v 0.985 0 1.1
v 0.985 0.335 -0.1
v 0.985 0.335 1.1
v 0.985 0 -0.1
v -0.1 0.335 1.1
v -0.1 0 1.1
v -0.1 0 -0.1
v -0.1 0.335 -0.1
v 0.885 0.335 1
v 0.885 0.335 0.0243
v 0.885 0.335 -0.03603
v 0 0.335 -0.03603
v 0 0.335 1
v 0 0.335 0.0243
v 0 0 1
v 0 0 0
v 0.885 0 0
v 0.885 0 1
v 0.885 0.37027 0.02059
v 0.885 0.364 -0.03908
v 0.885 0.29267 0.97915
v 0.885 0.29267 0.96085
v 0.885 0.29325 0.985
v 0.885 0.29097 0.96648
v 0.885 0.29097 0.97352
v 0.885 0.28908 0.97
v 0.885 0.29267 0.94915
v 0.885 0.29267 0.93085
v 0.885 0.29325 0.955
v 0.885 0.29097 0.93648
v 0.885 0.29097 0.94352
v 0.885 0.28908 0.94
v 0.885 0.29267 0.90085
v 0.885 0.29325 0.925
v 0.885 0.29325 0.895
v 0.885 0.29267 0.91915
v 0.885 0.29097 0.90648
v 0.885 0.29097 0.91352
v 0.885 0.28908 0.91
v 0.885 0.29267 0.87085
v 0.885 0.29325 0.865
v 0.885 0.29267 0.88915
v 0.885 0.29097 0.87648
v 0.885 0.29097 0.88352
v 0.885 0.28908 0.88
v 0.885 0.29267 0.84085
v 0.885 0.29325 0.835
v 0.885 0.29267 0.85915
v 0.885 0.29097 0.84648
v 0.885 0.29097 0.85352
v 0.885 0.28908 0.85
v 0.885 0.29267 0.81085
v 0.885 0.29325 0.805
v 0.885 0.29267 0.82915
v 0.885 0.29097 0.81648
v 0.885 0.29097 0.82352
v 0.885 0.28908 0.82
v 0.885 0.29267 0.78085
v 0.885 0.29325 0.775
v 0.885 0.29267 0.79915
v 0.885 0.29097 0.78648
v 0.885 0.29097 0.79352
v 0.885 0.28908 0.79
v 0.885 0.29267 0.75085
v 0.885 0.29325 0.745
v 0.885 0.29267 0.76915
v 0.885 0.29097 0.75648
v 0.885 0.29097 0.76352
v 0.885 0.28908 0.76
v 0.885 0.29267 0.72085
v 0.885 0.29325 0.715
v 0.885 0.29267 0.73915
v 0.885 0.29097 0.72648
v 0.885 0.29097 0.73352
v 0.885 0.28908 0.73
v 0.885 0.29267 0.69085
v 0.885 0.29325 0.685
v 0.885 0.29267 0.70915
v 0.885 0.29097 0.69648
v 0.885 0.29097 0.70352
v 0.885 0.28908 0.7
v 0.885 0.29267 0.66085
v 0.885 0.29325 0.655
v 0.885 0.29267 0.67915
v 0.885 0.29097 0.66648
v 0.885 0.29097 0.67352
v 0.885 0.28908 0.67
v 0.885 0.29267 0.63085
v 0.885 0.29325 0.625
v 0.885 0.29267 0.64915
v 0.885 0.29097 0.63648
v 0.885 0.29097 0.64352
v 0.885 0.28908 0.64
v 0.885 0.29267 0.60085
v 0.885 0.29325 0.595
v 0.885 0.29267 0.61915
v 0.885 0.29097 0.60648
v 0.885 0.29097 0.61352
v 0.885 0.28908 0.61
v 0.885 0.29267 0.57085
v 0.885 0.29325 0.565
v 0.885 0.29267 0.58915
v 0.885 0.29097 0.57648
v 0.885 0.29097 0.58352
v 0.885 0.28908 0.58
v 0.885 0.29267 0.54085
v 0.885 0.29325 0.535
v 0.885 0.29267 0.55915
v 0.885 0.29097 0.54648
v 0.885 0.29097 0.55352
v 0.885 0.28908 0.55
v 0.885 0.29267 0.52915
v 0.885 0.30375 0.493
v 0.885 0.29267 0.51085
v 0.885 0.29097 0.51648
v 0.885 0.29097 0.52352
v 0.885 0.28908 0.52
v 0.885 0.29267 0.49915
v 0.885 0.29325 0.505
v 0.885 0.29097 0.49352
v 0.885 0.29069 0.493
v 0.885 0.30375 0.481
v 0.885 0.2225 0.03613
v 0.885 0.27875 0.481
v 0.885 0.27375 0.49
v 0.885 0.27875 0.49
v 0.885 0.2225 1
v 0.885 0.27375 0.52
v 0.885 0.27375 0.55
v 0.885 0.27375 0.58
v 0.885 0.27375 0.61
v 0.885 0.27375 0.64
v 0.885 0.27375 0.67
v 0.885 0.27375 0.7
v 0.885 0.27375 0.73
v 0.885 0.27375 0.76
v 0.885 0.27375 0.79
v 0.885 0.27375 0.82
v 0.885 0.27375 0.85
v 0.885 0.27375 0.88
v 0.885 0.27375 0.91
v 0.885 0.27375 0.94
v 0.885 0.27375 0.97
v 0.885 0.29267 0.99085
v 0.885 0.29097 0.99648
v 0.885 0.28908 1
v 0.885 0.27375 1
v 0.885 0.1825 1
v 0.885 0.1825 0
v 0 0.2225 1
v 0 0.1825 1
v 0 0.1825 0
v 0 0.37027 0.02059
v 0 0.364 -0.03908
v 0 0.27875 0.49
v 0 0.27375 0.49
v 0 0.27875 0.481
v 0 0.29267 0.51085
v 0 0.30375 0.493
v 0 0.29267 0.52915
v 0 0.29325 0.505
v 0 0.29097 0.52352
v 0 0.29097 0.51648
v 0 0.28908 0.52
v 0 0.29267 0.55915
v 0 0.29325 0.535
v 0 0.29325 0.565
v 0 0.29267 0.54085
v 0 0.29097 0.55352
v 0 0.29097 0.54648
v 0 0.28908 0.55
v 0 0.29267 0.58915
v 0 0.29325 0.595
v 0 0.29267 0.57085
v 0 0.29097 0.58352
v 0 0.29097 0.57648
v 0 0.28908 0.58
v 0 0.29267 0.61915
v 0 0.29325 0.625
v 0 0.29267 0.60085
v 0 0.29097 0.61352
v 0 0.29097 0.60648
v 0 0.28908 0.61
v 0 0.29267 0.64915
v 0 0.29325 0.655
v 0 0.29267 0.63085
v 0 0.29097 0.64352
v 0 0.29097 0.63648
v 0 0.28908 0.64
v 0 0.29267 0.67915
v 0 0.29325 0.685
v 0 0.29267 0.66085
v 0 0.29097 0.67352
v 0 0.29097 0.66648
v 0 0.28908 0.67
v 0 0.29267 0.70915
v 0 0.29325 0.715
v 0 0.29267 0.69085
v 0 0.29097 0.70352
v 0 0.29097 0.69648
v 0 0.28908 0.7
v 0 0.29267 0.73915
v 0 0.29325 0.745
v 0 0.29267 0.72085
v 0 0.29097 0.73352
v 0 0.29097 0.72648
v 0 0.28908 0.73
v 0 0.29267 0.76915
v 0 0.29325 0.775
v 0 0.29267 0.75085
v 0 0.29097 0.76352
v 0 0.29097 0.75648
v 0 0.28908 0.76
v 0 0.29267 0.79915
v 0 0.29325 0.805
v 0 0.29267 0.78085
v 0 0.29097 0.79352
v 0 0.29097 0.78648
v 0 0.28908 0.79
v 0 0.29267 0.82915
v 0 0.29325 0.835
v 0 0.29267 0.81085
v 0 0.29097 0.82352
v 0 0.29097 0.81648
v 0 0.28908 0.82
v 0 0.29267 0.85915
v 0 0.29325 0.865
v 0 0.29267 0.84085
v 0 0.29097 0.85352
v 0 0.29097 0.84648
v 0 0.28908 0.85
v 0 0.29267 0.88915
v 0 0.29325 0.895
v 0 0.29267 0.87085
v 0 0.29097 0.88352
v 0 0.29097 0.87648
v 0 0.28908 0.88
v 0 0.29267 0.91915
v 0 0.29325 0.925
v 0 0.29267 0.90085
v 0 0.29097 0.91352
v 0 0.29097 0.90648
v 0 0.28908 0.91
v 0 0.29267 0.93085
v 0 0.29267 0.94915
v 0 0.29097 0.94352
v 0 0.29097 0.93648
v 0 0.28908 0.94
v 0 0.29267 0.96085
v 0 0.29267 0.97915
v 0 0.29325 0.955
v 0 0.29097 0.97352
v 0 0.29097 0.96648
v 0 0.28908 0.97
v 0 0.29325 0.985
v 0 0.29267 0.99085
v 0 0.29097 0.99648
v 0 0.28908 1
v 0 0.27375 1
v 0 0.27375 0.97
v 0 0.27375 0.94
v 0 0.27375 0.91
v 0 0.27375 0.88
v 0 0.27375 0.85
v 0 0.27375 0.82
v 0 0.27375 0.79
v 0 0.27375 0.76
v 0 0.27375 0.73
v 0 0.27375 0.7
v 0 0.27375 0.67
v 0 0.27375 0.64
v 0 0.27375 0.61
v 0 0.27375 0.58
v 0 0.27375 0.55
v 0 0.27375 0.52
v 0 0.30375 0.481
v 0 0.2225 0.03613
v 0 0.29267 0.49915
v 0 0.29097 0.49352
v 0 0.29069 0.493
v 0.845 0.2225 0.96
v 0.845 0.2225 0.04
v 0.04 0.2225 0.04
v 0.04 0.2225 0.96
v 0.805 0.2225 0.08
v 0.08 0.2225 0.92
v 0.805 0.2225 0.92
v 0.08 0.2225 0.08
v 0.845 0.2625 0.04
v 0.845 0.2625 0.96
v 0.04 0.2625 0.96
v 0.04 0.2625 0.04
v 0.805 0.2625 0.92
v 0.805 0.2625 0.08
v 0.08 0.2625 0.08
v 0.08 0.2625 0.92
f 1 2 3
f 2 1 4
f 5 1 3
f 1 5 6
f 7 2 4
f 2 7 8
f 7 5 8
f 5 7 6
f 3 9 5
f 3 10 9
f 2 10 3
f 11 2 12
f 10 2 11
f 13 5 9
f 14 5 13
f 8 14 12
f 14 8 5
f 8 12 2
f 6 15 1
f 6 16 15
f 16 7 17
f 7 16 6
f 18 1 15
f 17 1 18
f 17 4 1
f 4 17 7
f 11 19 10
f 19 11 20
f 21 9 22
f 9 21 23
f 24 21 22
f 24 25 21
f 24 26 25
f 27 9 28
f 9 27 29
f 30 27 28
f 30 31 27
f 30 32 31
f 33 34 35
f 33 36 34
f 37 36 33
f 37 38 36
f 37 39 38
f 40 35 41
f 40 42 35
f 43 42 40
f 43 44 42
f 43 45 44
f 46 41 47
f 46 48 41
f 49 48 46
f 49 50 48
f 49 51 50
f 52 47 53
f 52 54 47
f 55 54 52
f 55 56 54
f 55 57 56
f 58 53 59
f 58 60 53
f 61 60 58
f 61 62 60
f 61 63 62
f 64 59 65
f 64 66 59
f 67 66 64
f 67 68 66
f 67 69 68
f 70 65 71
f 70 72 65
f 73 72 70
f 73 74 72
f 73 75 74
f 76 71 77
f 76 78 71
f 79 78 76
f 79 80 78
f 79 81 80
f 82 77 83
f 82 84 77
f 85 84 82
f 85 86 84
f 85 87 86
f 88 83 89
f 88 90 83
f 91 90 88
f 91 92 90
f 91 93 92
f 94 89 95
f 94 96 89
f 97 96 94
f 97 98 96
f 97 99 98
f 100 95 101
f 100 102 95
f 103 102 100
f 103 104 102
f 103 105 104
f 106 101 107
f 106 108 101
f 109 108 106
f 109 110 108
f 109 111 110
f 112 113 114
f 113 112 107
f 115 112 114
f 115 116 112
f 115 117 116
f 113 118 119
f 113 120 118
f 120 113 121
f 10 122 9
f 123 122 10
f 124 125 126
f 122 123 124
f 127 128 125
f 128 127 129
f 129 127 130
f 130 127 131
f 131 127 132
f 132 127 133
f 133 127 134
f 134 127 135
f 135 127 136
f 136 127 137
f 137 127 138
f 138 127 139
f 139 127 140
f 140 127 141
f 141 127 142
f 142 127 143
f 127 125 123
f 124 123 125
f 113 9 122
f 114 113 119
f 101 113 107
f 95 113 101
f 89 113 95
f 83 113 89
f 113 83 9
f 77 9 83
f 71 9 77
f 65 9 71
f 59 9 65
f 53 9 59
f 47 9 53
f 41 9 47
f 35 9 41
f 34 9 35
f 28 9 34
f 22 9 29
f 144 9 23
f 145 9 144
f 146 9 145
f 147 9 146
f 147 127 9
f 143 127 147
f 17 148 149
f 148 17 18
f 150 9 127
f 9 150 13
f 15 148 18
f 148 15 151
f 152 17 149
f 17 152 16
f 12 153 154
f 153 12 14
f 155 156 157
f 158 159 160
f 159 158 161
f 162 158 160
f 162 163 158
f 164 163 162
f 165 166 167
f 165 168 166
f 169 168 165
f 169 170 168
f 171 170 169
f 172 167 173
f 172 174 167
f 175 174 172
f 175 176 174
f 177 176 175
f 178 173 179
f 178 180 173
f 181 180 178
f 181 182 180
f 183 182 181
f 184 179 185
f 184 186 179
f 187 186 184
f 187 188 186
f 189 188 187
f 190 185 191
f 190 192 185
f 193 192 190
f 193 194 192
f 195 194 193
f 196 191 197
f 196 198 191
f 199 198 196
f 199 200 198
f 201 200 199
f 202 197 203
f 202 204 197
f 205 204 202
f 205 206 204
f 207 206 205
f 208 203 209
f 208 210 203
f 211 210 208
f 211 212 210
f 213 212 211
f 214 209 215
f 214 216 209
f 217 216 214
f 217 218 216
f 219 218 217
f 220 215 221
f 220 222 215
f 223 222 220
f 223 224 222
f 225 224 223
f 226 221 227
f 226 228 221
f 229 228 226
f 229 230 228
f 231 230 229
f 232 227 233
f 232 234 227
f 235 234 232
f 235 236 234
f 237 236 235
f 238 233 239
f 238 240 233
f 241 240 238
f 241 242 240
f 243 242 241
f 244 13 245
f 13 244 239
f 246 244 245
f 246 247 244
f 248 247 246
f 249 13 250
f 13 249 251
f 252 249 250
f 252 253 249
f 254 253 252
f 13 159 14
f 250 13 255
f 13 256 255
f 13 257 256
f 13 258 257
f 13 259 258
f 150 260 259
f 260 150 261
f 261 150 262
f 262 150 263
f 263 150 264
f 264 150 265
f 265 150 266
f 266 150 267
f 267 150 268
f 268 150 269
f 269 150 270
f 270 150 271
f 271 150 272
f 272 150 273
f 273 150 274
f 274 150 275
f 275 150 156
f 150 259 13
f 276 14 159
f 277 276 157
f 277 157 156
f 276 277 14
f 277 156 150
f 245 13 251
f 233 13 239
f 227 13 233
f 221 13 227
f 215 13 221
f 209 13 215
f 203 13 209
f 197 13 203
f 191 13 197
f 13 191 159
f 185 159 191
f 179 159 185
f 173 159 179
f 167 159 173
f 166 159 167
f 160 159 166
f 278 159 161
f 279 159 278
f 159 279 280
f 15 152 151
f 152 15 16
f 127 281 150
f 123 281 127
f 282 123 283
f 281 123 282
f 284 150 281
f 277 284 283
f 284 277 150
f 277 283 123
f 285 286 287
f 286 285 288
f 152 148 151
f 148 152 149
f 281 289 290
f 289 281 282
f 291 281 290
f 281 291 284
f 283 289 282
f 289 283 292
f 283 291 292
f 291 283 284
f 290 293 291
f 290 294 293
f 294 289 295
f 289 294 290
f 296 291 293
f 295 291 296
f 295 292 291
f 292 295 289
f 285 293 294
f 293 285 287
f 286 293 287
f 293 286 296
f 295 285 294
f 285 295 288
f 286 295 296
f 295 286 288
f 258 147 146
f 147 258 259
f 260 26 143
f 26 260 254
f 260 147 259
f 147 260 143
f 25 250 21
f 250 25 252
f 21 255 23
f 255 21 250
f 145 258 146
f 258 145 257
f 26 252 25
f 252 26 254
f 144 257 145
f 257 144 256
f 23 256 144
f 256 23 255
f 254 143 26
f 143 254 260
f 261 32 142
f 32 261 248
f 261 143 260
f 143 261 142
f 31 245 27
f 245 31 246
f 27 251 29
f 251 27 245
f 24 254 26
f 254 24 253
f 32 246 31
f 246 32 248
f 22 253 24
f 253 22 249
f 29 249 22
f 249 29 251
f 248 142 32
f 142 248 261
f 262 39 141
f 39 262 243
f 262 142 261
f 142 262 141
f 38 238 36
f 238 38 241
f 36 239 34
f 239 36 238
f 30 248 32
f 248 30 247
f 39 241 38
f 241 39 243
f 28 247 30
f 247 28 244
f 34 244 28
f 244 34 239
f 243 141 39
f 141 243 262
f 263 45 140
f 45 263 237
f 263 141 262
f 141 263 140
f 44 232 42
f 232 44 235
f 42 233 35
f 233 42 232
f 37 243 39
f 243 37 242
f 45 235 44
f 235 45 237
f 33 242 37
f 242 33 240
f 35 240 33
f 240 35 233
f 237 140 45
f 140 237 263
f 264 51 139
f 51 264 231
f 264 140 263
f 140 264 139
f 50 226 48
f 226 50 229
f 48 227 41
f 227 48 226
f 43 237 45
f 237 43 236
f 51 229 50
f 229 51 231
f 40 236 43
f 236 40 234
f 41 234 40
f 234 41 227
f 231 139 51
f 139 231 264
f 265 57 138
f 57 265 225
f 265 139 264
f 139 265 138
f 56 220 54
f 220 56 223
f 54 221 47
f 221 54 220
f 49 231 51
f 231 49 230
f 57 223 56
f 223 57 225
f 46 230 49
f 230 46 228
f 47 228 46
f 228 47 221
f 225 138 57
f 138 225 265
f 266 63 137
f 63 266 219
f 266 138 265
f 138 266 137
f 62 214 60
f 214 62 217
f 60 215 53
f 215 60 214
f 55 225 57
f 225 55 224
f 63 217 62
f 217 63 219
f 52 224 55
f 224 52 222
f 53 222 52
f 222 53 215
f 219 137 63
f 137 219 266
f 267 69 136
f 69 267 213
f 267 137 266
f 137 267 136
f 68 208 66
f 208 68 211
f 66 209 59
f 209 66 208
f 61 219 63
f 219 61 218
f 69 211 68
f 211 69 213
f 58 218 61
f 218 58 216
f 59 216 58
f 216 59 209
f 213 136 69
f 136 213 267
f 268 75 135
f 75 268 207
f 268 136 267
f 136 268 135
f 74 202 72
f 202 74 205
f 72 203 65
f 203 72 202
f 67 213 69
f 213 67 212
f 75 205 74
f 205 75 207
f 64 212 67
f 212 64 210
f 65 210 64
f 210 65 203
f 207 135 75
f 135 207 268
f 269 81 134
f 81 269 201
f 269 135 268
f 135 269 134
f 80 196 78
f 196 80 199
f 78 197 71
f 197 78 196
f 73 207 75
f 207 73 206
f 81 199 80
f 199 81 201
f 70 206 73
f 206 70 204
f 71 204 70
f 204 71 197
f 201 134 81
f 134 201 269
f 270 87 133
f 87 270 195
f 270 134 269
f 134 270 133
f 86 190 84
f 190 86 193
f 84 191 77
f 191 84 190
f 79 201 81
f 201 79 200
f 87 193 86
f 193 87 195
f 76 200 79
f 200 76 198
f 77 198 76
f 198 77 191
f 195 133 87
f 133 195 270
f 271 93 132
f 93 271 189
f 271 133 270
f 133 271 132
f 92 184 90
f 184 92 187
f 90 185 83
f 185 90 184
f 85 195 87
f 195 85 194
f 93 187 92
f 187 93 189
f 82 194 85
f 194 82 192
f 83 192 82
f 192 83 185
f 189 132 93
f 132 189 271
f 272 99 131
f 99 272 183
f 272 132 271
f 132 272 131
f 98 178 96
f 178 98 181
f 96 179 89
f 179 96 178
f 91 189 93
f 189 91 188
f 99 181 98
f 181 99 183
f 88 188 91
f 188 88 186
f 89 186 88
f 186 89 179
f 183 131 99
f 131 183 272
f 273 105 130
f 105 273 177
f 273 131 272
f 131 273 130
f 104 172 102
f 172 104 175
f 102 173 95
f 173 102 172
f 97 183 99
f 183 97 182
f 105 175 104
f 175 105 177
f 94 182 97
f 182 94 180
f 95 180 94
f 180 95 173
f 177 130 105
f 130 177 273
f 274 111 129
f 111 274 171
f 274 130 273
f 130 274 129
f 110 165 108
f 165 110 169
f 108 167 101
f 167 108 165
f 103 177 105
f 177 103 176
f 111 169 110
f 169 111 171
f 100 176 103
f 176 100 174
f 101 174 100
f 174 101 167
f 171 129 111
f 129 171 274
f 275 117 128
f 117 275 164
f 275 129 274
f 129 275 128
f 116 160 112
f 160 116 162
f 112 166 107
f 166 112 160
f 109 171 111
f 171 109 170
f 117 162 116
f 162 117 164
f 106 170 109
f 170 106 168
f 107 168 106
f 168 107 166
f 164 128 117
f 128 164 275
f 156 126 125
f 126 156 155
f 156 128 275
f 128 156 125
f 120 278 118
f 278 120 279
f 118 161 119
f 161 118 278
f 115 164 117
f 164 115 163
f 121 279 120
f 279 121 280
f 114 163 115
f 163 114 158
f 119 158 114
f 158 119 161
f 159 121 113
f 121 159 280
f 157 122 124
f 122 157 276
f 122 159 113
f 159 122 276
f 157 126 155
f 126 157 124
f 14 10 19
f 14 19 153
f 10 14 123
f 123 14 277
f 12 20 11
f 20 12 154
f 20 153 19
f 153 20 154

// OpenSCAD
// file: HausCommon.scad
OUTER_WALL_THICKNESS = 0.365;
WALL_HEIGHT = 2.95;
THIN_INNER_WALL_THICKNESS = 0.115;
THICK_INNER_WALL_THICKNESS = 0.175;

DEFAULT_BRH = 0.84;
FLOOR_HEIGHT = 0.19;

module slot(width, shift, height, z) {
    translate([shift, -OUTER_WALL_THICKNESS*0.05, z])
        cube([width, OUTER_WALL_THICKNESS * 1.1, height]);
}

module window(width, shift, height = 0.54, brh = DEFAULT_BRH) {
    slot(width, shift, height, FLOOR_HEIGHT + brh); 
}

module door(shift, width = 0.885, height = 2.01) {
    slot(width, shift, height, FLOOR_HEIGHT);
}


module wall(width, thickness, shift_x = 0.0, shift_y = 0.0, height = WALL_HEIGHT) {
    translate([shift_x, shift_y, 0]) {
        difference() {
            cube([width, thickness, height]);
            children();
        }
    }
}

module outer_wall(width, shift_x = 0.0, shift_y = 0.0, height = WALL_HEIGHT) {
    color("Gray") wall(width, OUTER_WALL_THICKNESS, shift_x, shift_y, height) {
            children();
    }
}

module inner_wall(width, thickness, shift_x = 0.0, shift_y = 0.0, height = WALL_HEIGHT) {
    color("White") translate([OUTER_WALL_THICKNESS, OUTER_WALL_THICKNESS,0])
        wall(width, thickness, shift_x, shift_y, height) {
            children();    
        }
    
}

module thick_inner_wall(width, shift_x = 0.0, shift_y = 0.0, height = WALL_HEIGHT) {
    inner_wall(width, 0.175, shift_x, shift_y, height) {
        children();
    }
}

module thin_inner_wall(width, shift_x = 0.0, shift_y = 0.0, height = WALL_HEIGHT) {
    inner_wall(width, 0.115, shift_x, shift_y, height) {
        children();
    }
}

module ground(width, height, shift_x = 0.0, shift_y = 0.0) {
    translate([OUTER_WALL_THICKNESS + shift_x, OUTER_WALL_THICKNESS + shift_y,0]) {
        cube([width, height, FLOOR_HEIGHT]);
    }
}


module part(name) {
    if (is_undef($PART) || $PART == name) {
        children();
    }
}

module colored_part(name, part_color) {
    if (is_undef($PART) || $PART == name) {
        color(part_color) children();
    }
}


module horizontal() {
    Mvert = [ [ 0  , 1  , 0  , 0   ],
      [ 1  , 0  , 0  , 0   ],
      [ 0  , 0  , 1  , 0   ],
      [ 0  , 0  , 0  , 1   ] ] ;
    multmatrix(Mvert) { children(); }
} 
// main file
include <HausCommon.scad>;


EDGING_WIDTH = 0.1;
EDGING_SUNK = 0.03;

WINDOWFRAME_WIDTH = 0.04;
WINDOWFRAME_OFFSET = 0.04;
BLIND_WIDTH = 0.03;


module window_frame(width, height, thickness, subdivisions = 1, blind = 0.5) {
    module frame(inset, pos, frame_thickness) {
        difference() {
        e = EDGING_WIDTH;
        translate([-e,0,-e])
            cube([width + e * 2, thickness - EDGING_SUNK, height + e * 2]);
        translate([0,-e,0])
        cube([width, thickness + e*2, height]);
    }
    }
    
    // Edging
    colored_part("EDGING", "White") difference() {
        e = EDGING_WIDTH;
        translate([-e,0,-e])
            cube([width + e * 2, thickness - EDGING_SUNK, height + e * 2]);
        translate([0,-thickness,0])
        cube([width, thickness*3, height]);
    }
    
    colored_part("WINDOWFRAME", "DimGray") { 
        difference() {
            e = WINDOWFRAME_WIDTH;
            translate([0,thickness*0.5,0])
                cube([width, 0.04, height]);
            translate([e,-thickness,e])
                cube([width - e * 2, thickness*3, height - e * 2]);
        }
        
        difference() {
            inset = WINDOWFRAME_OFFSET;
            e = WINDOWFRAME_WIDTH;
            translate([inset,thickness*0.5 + 0.04,inset])
                cube([width - inset*2, 0.04, height - inset*2]);
            translate([e + inset,-thickness,e + inset])
                cube([width - (e + inset) * 2, thickness*3, height - (e + inset) * 2]);
        }
        
        if (subdivisions >= 2) {
            for (i = [1:subdivisions-1]) {
                inset = WINDOWFRAME_OFFSET;
                e = WINDOWFRAME_WIDTH;
                translate([inset+ i * (width - inset*2) / subdivisions - e / 2,thickness*0.5 + 0.02 ,inset])
                cube([e, 0.04, height - (e) * 2]);
            }
        }
    }
    
    colored_part("WINDOWSILL", "Black") {
        translate([0, thickness/2,-0.02]) rotate([-6,0,0]) cube([width, thickness*0.5, 0.06]);
    }
    
    colored_part("WINDOWGLASS", [0.3,0.3,0.3,0.1]) {
        translate([0,thickness*0.5,0])
                cube([width, 0.04, height]);
    }
    
    colored_part("BLIND", "White") {
        blindcount = floor(blind*height/BLIND_WIDTH);
        for (i = [0:blindcount]) {
            translate([0,thickness*0.75, height - i*BLIND_WIDTH - BLIND_WIDTH]) {
                intersection() {
                    cube([width, 0.02, BLIND_WIDTH]);
                    translate([0,-BLIND_WIDTH*0.35,BLIND_WIDTH*0.5]) rotate([0,90,0]) cylinder(r = BLIND_WIDTH, h = width, $fn = 32);
                }
                
                if (i == blindcount)
                translate([0,0.005, -BLIND_WIDTH*0.3]) cube([width, 0.025, BLIND_WIDTH*0.4]);
            }
        }
        
    }
    
}


window_frame(0.885, 1.0, 0.365);
